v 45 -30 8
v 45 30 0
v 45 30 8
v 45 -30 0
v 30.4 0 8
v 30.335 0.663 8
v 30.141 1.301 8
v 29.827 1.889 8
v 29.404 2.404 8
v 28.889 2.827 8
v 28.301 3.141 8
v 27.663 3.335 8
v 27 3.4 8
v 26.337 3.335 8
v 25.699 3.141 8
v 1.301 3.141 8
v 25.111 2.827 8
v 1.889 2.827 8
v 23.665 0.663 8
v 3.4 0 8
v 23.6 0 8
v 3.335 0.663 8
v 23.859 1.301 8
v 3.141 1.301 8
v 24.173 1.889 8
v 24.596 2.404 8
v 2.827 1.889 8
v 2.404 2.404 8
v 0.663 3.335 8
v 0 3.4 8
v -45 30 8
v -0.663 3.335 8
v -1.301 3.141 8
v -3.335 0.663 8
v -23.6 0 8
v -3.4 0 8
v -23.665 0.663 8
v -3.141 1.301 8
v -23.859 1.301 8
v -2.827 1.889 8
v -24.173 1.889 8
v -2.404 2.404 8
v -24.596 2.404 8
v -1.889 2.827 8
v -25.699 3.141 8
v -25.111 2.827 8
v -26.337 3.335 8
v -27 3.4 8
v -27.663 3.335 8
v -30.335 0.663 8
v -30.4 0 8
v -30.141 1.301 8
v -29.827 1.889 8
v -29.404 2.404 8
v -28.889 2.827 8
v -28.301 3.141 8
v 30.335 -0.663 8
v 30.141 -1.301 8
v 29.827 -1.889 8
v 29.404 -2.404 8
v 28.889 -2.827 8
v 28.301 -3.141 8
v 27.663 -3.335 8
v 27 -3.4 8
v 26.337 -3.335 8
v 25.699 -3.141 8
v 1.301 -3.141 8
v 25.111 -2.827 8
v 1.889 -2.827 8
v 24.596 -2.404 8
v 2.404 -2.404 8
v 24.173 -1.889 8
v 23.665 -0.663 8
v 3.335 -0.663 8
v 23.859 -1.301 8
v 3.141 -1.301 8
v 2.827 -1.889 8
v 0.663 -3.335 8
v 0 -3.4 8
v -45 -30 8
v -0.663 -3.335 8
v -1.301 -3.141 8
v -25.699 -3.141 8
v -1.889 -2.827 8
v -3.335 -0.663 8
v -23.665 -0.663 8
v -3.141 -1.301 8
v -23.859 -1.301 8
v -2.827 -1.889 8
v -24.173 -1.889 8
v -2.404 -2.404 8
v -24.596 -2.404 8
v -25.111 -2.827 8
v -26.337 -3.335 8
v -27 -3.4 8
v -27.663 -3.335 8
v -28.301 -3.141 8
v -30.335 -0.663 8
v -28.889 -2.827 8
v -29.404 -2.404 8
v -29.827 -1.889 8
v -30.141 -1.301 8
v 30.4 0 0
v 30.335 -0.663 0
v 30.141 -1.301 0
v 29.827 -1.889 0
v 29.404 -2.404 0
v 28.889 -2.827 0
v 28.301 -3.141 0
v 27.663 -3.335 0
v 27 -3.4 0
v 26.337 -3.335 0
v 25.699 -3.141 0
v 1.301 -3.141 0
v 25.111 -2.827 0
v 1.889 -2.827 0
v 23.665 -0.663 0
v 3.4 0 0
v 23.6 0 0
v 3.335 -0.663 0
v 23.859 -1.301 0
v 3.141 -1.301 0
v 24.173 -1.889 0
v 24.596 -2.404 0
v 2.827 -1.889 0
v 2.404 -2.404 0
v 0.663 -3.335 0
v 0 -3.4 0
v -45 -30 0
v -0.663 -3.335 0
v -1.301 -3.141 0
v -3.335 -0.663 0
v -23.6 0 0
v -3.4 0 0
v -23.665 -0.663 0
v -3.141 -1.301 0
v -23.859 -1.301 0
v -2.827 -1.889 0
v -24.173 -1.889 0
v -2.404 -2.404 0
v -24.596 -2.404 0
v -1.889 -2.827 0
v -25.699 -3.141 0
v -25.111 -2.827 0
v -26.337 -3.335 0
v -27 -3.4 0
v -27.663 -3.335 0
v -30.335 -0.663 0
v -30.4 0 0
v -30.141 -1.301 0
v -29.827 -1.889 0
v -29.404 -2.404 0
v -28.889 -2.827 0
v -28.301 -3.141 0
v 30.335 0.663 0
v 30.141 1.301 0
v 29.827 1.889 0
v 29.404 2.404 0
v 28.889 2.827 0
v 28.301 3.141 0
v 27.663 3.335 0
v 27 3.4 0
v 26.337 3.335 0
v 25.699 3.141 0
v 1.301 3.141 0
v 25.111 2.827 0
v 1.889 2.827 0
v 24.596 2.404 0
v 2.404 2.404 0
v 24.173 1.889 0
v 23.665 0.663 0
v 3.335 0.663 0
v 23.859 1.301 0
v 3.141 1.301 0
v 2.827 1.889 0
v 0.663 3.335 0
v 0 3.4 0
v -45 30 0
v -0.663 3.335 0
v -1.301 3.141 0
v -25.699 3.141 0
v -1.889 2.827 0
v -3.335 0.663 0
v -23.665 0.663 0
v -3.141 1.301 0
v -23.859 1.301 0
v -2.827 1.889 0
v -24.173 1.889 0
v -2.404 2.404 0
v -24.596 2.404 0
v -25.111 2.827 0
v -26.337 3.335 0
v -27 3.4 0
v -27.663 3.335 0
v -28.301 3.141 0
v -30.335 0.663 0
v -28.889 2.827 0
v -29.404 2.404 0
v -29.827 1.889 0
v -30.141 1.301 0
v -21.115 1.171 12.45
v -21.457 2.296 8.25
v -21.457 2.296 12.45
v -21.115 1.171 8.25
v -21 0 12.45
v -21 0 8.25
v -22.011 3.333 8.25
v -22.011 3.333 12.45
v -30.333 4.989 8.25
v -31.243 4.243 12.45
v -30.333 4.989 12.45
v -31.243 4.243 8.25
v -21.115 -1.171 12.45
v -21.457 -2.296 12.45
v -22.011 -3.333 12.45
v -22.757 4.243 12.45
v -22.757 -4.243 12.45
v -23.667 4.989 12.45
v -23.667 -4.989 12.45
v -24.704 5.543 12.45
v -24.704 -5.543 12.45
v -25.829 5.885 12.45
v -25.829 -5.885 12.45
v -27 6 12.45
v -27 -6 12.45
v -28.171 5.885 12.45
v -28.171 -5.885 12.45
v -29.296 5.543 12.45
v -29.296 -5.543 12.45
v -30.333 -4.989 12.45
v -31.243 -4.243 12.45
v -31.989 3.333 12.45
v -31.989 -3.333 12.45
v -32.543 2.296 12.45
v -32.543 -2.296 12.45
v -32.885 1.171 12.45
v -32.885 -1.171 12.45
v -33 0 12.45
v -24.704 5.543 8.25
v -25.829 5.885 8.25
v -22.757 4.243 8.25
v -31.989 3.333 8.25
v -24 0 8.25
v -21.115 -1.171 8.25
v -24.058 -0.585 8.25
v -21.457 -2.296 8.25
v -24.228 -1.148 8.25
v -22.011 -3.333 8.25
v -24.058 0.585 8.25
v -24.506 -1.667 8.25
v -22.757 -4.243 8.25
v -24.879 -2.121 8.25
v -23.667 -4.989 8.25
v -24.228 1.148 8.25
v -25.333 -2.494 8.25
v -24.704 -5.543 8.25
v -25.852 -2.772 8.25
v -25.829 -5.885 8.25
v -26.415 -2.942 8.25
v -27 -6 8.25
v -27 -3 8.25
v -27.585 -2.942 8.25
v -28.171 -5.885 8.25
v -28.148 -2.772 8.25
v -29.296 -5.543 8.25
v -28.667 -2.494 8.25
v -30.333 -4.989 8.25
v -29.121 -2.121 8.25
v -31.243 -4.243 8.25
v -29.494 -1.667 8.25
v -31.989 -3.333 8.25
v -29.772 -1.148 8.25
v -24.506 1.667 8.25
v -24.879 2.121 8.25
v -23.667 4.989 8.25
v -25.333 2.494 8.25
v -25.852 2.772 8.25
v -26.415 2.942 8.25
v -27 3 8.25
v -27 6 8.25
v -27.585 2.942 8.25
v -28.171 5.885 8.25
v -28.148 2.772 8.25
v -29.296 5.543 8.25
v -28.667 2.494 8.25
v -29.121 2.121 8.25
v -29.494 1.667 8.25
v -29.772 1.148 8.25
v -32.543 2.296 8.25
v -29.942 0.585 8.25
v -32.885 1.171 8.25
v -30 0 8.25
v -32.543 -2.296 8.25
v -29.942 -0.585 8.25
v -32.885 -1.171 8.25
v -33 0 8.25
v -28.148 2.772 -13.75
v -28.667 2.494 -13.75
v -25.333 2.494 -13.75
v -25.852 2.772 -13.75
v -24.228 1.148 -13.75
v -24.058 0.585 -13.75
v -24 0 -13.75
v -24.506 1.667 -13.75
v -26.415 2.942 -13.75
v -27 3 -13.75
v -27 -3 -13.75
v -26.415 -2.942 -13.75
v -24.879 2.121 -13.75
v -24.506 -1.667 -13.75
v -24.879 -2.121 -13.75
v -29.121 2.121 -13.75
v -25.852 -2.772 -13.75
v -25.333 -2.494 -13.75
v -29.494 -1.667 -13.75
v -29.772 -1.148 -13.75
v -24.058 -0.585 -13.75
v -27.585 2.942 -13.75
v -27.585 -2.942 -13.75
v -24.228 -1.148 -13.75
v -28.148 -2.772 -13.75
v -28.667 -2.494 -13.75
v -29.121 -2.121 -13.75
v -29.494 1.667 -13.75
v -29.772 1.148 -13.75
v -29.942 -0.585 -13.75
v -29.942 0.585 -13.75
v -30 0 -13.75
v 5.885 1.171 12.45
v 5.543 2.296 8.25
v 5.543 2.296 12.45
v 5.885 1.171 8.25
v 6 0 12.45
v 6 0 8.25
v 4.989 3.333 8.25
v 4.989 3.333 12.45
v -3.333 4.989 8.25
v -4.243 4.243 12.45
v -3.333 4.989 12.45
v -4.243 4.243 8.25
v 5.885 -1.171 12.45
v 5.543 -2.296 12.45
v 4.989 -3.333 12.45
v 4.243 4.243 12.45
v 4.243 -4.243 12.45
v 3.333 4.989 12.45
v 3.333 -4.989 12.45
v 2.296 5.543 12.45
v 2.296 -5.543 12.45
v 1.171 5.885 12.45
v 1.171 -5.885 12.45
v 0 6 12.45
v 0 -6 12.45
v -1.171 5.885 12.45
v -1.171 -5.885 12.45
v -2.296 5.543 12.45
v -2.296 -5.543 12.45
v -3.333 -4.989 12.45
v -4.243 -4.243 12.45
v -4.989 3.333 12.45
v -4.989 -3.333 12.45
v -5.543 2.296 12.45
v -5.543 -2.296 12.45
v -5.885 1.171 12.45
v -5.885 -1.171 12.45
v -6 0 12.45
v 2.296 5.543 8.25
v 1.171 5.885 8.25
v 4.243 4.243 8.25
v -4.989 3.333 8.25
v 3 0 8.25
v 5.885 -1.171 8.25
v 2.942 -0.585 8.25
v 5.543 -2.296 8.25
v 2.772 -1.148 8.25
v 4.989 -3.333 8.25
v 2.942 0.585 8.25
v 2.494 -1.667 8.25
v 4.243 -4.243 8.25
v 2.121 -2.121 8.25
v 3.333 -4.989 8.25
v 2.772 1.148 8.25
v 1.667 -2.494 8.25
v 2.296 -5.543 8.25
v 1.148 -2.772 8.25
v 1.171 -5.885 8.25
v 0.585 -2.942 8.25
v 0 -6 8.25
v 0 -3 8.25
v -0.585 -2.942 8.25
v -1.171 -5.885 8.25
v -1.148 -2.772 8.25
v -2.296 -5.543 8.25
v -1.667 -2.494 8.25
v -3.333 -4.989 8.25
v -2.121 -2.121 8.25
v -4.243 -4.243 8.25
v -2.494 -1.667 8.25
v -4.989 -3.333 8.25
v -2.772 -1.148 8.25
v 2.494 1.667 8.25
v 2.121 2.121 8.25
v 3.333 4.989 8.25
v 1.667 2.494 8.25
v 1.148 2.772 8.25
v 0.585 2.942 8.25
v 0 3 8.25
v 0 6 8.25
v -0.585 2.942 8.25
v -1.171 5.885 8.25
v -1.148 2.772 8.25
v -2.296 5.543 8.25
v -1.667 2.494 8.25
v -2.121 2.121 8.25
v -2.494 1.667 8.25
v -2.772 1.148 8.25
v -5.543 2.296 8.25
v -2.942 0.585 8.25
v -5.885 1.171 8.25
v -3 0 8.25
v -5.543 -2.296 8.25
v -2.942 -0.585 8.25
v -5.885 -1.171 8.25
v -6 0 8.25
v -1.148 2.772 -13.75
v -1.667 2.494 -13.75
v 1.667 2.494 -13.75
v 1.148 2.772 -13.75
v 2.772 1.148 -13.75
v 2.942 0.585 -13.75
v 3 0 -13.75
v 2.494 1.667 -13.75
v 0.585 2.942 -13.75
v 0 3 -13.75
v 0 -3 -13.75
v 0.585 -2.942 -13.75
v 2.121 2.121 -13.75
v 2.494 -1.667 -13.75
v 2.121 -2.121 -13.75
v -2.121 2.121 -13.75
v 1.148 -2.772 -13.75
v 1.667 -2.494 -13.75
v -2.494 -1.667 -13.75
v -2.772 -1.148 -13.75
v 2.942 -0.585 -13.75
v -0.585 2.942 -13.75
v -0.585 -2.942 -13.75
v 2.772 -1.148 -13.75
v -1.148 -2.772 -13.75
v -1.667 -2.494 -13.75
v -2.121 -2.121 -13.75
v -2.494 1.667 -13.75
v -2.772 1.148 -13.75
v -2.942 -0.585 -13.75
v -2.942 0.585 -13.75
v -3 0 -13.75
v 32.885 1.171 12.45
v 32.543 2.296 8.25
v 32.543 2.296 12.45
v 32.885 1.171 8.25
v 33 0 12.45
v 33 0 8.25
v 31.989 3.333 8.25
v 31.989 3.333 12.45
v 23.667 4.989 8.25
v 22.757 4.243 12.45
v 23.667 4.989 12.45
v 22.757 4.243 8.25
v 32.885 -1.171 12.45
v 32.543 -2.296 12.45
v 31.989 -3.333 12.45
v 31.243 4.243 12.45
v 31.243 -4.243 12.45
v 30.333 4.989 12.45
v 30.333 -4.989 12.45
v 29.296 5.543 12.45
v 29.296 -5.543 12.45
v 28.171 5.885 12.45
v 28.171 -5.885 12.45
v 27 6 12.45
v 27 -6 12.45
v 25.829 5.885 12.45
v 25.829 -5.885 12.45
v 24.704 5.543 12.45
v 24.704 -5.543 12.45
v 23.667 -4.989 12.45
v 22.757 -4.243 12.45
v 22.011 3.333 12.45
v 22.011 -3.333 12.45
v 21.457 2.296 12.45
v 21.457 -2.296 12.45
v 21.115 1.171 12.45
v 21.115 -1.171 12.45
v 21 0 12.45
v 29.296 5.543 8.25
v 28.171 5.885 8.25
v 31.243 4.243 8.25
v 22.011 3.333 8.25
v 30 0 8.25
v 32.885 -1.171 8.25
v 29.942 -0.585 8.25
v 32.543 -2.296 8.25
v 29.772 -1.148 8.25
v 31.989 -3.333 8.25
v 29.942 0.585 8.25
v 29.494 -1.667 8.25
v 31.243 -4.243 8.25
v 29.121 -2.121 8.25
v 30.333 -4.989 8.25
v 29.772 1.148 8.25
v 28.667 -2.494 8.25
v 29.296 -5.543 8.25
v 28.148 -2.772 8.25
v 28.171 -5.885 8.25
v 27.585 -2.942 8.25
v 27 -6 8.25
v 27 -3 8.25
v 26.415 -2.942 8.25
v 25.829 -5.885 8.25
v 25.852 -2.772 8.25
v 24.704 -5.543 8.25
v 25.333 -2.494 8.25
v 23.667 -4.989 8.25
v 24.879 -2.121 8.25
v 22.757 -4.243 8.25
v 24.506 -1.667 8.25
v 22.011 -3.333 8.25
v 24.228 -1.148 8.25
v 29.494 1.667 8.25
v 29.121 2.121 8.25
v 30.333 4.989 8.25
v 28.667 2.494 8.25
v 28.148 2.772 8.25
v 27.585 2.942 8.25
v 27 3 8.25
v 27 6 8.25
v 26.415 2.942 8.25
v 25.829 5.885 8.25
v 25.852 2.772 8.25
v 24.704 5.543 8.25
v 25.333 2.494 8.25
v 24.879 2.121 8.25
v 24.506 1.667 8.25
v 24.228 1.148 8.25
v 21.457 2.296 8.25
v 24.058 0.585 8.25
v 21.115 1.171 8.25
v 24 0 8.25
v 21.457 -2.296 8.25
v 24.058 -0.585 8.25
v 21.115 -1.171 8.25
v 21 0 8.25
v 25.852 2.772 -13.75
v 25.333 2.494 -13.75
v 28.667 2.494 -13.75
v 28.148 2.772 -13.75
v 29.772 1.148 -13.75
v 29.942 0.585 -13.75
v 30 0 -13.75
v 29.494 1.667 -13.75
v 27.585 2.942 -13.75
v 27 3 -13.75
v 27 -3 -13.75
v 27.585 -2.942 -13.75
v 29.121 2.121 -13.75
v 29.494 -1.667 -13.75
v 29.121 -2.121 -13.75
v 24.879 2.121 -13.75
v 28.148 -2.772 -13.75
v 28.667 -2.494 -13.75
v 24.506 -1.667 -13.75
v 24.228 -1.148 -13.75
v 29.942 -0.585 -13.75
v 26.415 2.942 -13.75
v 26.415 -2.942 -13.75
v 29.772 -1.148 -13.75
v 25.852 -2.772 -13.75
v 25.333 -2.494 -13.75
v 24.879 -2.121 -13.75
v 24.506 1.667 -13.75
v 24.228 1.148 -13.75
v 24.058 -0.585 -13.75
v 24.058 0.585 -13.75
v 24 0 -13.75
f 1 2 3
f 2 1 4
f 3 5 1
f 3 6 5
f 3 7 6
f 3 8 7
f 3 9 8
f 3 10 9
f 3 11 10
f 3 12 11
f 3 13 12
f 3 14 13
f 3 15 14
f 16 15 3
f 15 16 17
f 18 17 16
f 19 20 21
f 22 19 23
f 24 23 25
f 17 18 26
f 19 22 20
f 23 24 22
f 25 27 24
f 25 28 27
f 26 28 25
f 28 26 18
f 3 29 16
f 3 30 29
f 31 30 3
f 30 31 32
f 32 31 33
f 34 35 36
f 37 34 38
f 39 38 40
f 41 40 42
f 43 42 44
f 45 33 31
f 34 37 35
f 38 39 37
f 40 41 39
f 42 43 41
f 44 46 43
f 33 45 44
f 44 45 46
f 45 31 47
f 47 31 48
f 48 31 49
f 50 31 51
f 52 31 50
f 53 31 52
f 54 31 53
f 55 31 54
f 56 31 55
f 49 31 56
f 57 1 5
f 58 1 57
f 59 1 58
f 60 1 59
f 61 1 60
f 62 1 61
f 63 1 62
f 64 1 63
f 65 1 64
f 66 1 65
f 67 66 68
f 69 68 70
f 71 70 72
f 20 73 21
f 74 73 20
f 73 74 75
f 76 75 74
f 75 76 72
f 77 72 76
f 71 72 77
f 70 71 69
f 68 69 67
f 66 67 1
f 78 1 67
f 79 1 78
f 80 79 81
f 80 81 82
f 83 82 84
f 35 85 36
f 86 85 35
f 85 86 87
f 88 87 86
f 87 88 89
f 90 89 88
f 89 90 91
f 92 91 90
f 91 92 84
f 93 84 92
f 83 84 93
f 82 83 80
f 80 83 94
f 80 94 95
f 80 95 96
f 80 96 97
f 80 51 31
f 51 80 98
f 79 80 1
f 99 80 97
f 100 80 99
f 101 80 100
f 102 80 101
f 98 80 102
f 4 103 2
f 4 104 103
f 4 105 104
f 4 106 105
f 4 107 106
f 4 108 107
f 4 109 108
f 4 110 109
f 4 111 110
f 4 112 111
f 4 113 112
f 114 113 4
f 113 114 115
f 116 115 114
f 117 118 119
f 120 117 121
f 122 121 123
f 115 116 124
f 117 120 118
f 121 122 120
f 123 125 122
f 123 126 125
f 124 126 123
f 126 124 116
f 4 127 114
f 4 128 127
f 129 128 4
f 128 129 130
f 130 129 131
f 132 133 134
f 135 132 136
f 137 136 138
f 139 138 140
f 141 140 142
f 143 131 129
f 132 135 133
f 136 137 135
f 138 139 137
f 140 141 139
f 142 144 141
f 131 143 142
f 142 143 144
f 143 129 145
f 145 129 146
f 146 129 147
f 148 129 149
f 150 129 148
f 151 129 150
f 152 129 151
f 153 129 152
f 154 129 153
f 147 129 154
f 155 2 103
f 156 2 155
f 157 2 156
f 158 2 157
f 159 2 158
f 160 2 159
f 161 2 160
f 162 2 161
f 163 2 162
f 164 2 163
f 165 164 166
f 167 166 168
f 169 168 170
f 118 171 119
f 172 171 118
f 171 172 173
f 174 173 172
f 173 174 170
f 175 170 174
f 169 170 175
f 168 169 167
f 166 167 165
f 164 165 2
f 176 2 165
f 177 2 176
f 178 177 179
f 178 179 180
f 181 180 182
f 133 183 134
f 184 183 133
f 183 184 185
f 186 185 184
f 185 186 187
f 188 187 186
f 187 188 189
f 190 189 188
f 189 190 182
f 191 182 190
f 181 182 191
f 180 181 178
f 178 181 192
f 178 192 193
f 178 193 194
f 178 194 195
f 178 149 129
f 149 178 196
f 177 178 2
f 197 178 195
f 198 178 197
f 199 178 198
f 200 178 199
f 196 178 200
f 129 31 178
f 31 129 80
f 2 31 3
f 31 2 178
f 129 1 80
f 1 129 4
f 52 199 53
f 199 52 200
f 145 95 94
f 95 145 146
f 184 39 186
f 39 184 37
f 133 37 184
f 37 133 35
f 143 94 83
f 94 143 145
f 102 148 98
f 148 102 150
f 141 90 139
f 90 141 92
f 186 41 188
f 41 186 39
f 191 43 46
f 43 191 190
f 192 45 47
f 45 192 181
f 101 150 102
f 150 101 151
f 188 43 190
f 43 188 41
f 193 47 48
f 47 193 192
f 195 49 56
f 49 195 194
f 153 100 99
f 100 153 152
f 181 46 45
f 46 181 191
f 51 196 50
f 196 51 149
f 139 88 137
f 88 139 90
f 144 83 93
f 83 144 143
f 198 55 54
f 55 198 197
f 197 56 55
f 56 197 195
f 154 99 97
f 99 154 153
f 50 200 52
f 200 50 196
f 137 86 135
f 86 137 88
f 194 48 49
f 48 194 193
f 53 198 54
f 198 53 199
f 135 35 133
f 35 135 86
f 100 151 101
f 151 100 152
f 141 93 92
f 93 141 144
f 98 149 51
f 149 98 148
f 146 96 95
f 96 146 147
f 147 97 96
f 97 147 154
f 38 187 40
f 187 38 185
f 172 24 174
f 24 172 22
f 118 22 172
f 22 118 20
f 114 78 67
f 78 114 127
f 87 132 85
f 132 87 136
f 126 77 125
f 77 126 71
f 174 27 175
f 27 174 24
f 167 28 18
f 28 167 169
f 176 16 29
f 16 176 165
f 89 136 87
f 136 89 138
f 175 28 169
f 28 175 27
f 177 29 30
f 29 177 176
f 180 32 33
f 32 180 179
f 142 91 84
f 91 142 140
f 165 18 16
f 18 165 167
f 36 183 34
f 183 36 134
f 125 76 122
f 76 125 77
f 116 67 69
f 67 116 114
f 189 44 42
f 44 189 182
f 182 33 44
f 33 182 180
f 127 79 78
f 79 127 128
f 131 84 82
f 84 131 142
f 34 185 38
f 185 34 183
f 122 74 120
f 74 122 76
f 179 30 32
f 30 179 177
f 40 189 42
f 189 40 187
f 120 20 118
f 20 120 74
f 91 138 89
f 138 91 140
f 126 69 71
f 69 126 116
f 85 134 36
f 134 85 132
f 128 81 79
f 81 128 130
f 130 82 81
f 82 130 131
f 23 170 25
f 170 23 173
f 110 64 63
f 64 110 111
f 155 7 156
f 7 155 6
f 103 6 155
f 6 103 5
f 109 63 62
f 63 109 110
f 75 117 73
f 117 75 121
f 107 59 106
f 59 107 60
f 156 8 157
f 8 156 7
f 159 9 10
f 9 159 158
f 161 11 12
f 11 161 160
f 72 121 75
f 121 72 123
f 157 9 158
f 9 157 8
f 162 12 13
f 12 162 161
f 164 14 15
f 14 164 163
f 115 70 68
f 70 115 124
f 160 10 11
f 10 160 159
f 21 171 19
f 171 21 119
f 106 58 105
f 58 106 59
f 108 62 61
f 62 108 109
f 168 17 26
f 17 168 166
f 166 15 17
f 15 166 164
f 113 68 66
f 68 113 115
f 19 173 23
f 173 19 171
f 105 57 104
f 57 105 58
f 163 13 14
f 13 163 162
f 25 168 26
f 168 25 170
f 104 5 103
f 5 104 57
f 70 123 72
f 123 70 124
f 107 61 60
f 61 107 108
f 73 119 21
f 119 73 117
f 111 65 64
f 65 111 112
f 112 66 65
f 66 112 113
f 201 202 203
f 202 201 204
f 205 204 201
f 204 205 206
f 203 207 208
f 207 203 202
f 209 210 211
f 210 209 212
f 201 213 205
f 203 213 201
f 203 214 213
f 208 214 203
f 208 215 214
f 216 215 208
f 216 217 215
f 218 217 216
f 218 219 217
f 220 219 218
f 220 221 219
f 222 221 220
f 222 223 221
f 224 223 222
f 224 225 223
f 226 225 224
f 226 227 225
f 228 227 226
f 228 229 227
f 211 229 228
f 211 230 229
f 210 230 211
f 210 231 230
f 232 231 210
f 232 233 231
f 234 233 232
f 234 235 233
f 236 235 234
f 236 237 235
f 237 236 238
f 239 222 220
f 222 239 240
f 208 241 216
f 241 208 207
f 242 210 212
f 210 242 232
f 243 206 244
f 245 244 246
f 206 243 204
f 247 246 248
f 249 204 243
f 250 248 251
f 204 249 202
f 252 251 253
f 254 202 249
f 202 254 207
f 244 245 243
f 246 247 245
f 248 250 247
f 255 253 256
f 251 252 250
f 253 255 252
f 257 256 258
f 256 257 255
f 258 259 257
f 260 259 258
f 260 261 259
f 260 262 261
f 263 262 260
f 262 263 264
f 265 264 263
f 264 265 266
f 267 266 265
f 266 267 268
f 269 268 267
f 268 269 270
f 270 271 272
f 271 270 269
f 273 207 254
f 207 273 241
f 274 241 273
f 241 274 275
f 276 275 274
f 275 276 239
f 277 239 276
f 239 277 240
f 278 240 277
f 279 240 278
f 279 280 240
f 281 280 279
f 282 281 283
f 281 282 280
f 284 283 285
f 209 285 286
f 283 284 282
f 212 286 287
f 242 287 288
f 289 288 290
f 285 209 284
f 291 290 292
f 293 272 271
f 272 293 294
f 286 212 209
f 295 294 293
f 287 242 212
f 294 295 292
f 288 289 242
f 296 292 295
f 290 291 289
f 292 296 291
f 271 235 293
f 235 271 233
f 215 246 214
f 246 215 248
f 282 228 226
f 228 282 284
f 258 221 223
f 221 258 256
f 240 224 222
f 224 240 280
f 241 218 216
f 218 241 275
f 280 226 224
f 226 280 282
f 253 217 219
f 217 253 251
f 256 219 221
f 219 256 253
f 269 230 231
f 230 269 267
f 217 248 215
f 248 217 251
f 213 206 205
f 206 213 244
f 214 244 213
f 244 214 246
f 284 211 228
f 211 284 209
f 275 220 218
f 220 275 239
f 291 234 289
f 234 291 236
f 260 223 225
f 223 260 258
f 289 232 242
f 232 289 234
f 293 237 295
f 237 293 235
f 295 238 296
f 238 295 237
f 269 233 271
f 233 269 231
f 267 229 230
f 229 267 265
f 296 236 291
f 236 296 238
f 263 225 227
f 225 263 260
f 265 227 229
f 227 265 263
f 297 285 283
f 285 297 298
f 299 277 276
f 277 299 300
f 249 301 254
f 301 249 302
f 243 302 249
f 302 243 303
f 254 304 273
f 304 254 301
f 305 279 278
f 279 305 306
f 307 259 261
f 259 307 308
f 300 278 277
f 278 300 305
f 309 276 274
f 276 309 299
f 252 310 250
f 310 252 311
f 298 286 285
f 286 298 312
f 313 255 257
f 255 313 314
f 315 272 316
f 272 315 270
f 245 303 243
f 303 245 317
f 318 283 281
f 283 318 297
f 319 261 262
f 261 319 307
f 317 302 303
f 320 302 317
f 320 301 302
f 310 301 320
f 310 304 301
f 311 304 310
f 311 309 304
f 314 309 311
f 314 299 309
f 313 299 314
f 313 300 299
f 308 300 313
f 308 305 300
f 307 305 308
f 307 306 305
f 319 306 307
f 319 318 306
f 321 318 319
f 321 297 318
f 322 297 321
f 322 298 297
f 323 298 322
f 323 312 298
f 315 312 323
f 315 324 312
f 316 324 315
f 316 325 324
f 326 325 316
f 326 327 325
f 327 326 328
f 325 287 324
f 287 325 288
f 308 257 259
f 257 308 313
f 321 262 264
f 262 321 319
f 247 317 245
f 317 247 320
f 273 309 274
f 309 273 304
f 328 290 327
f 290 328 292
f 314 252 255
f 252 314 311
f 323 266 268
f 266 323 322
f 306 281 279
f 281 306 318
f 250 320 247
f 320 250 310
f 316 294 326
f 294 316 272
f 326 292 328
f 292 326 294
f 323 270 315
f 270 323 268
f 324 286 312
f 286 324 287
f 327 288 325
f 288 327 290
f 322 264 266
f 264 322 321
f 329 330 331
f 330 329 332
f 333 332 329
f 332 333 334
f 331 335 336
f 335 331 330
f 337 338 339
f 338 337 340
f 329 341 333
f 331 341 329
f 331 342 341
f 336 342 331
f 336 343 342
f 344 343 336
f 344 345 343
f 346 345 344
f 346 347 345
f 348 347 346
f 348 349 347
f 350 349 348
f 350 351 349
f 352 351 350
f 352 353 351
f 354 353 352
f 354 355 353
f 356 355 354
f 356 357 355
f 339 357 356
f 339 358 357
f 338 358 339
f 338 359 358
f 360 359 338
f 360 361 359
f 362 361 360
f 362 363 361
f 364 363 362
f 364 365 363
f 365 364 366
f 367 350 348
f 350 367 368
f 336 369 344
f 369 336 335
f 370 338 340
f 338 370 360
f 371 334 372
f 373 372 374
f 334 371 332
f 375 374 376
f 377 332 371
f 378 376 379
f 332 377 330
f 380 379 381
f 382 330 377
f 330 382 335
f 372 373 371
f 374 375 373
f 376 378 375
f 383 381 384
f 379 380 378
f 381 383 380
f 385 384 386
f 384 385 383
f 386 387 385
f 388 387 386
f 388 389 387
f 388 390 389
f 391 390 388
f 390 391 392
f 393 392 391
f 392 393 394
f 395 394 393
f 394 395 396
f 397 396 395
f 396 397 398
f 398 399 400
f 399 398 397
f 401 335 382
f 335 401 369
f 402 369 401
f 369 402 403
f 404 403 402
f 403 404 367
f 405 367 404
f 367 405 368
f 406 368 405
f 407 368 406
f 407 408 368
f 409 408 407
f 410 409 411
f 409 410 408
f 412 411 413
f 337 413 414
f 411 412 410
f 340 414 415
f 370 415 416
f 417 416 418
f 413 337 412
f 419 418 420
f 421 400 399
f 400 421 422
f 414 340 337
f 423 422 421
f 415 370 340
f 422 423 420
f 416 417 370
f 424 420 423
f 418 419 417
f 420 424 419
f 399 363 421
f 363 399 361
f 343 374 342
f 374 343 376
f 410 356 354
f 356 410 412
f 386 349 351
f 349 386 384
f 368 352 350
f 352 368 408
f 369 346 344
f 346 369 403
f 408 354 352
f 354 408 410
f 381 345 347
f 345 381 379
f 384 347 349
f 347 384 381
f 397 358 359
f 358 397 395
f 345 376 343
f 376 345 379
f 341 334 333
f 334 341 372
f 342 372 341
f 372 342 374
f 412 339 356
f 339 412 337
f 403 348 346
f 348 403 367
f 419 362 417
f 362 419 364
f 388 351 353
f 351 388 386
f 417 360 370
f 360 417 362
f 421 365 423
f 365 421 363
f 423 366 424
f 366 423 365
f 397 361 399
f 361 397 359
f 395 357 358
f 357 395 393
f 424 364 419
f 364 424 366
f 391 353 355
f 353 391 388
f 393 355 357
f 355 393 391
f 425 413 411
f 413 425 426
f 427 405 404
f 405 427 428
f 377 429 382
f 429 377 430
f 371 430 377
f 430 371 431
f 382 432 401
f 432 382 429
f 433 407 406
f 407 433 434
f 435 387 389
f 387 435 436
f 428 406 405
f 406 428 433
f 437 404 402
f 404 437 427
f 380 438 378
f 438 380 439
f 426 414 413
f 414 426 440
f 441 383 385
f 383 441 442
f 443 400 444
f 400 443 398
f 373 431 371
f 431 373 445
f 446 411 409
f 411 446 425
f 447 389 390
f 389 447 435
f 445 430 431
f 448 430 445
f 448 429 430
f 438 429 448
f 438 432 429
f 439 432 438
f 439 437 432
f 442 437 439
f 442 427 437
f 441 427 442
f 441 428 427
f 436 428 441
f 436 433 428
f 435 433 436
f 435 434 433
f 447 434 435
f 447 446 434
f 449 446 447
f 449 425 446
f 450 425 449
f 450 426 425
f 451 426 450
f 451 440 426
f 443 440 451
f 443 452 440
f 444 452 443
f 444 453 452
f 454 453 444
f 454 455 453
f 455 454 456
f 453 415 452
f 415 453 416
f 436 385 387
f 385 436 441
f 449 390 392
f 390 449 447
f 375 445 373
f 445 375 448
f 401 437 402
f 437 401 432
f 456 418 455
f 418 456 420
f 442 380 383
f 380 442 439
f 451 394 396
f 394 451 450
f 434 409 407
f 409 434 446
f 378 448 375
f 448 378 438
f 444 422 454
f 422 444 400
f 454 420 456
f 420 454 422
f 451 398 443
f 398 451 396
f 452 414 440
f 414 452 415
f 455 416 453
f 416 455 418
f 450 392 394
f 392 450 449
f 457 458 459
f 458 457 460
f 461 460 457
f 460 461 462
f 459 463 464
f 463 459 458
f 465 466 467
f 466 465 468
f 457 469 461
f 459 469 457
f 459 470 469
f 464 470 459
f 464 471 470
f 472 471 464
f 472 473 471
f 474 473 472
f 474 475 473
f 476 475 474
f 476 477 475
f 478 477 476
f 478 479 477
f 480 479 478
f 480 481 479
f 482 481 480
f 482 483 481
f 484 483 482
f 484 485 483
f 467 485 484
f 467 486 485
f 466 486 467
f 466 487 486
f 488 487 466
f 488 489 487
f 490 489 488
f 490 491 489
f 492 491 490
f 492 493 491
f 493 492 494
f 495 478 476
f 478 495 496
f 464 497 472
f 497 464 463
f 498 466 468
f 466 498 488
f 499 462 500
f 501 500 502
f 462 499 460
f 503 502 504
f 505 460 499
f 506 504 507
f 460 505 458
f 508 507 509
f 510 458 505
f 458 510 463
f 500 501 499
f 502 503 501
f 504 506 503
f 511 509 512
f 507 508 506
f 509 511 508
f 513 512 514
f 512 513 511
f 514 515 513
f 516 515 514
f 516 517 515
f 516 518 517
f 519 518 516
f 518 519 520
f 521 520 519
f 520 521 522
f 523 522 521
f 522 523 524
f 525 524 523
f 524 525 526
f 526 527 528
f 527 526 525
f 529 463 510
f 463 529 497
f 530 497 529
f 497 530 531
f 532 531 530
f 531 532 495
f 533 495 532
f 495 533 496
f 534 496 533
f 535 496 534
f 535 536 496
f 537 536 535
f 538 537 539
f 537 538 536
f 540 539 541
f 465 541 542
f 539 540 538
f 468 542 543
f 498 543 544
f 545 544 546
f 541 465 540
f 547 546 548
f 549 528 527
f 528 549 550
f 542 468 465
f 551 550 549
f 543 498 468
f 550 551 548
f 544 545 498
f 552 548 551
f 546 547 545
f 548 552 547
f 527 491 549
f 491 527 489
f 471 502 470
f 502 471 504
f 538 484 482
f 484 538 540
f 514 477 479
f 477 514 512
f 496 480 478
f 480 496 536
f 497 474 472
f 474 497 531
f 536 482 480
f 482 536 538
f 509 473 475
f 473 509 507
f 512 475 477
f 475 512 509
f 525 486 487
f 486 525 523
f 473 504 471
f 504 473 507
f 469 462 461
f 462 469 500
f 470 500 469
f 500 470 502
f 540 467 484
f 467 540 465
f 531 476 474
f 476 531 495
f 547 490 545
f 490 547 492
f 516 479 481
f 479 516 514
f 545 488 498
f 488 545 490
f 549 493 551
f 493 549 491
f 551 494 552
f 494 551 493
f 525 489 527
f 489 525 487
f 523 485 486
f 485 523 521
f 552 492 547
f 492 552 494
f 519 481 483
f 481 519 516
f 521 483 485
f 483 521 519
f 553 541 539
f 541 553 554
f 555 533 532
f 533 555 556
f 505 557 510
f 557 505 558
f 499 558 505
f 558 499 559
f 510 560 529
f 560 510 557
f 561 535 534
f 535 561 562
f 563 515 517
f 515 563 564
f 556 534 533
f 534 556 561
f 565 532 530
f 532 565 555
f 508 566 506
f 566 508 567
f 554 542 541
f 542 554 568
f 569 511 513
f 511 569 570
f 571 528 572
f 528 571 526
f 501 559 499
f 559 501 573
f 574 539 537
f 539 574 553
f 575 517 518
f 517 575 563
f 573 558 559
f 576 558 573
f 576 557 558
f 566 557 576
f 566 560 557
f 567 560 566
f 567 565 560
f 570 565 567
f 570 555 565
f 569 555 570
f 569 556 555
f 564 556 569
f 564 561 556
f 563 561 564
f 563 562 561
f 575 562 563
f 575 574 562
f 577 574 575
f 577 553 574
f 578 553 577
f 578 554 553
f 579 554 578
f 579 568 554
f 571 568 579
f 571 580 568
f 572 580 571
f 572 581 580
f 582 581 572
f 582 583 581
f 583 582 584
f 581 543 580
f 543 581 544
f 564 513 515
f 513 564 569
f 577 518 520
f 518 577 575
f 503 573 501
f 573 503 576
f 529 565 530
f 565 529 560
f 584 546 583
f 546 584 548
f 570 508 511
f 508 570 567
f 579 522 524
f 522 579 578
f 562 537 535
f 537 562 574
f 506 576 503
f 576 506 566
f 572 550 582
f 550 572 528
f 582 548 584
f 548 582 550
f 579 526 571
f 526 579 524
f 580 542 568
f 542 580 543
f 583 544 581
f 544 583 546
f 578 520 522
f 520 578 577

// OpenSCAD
$fn = 32;

// ------------------------------------------------------------------------
// Bolted plate: 90 x 60 x 8 mm plate, 3 fasteners
// Every part is its own module, assembly() places them once.
// ------------------------------------------------------------------------

// --- part 1 ---
module plate() {
  difference() {
    translate([-45, -30, 0]) cube([90, 60, 8]);
    translate([-27, 0, -1]) cylinder(h = 10, d = 6.8);
    translate([0, 0, -1]) cylinder(h = 10, d = 6.8);
    translate([27, 0, -1]) cylinder(h = 10, d = 6.8);
  }
}

// --- part 2 ---
module bolt1() {
  cylinder(h = 4.2, d = 12);
  translate([0, 0, -22]) cylinder(h = 22, d = 6);
}

// --- part 3 ---
module bolt2() {
  cylinder(h = 4.2, d = 12);
  translate([0, 0, -22]) cylinder(h = 22, d = 6);
}

// --- part 4 ---
module bolt3() {
  cylinder(h = 4.2, d = 12);
  translate([0, 0, -22]) cylinder(h = 22, d = 6);
}

// --- assembly ---
module assembly() {
  translate([0, 0, 0]) rotate([0, 0, 0]) plate();
  translate([-27, 0, 8.25]) rotate([0, 0, 0]) bolt1();
  translate([0, 0, 8.25]) rotate([0, 0, 0]) bolt2();
  translate([27, 0, 8.25]) rotate([0, 0, 0]) bolt3();
}

assembly();
